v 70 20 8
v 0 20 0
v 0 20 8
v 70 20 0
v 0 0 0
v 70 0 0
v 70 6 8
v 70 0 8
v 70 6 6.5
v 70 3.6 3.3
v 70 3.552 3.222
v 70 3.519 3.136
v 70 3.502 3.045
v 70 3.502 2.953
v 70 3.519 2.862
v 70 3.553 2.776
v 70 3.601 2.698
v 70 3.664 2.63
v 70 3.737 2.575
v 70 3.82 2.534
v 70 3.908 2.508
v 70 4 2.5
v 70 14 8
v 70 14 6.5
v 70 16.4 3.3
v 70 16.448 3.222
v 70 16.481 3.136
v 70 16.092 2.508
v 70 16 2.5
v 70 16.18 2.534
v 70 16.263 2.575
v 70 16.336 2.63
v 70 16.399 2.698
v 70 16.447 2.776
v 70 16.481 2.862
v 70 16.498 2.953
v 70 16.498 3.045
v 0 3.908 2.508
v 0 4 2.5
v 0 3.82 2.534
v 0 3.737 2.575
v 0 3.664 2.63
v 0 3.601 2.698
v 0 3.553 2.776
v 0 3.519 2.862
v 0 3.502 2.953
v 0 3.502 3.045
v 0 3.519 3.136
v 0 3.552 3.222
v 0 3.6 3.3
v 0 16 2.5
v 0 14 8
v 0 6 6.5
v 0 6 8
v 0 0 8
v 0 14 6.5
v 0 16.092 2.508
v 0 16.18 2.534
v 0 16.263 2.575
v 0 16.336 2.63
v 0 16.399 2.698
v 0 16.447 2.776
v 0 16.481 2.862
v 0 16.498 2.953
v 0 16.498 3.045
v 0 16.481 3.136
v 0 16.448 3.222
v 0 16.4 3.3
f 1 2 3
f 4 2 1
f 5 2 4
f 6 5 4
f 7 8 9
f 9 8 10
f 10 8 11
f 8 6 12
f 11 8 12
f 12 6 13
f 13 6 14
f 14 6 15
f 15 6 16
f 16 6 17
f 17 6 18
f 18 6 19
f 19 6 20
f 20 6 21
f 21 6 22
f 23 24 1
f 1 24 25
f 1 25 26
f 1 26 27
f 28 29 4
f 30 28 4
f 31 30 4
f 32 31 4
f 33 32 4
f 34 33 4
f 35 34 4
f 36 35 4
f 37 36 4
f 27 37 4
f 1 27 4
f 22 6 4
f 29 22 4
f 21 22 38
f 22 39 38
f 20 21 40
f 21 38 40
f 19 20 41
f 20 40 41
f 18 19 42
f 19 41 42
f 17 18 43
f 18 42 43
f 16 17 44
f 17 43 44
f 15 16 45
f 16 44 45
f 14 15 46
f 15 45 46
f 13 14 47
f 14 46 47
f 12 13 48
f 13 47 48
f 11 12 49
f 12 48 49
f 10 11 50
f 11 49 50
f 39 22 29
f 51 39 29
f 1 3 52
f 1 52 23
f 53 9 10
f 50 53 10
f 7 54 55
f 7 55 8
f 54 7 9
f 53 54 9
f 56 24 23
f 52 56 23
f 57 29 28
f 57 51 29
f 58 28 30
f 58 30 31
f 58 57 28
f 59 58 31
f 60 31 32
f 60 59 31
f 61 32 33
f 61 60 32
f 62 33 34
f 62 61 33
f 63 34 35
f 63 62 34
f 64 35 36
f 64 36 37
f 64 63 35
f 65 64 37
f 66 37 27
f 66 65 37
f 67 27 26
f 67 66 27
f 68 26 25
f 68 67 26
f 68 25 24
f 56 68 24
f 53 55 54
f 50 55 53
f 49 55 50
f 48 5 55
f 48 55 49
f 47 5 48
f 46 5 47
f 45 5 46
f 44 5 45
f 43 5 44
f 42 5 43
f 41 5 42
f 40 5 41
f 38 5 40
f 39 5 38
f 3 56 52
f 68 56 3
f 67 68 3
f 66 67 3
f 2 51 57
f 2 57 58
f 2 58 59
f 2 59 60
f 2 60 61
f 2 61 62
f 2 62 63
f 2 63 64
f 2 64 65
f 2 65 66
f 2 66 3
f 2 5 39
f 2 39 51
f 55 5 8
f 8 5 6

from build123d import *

# Parameters (mm, degrees)
SKETCH1_W           = 70
SKETCH1_H           = 20
BOSS_EXTRUDE1_DEPTH = 8
CUT_EXTRUDE1_DEPTH  = 74.239333694
FILLET1_R           = 0.5
FILLET2_R           = 0.5


with BuildPart() as part:
    # Sketch1 → Boss-Extrude1 (new body)
    with BuildSketch(Plane.XY):
        with Locations((35, 10)):
            Rectangle(SKETCH1_W, SKETCH1_H)
    extrude(amount=BOSS_EXTRUDE1_DEPTH)

    # Sketch2 → Cut-Extrude1 (cut, through all)
    with BuildSketch(Plane(origin=(70, 0, 0), x_dir=(0, 0, -1), z_dir=(1, 0, 0))):
        Polygon((-8, 6), (-6.5, 6), (-2.5, 3), (-2.5, 17), (-6.5, 14), (-8, 14), align=None)
    extrude(amount=-CUT_EXTRUDE1_DEPTH, mode=Mode.SUBTRACT)

    # Fillet1
    fillet1_edges = [part.edges().sort_by_distance(p)[0] for p in [
        (35, 3, 2.5),
    ]]
    fillet(fillet1_edges, radius=FILLET1_R)

    # Fillet2
    fillet2_edges = [part.edges().sort_by_distance(p)[0] for p in [
        (35, 17, 2.5),
    ]]
    fillet(fillet2_edges, radius=FILLET2_R)


solid = part.part
